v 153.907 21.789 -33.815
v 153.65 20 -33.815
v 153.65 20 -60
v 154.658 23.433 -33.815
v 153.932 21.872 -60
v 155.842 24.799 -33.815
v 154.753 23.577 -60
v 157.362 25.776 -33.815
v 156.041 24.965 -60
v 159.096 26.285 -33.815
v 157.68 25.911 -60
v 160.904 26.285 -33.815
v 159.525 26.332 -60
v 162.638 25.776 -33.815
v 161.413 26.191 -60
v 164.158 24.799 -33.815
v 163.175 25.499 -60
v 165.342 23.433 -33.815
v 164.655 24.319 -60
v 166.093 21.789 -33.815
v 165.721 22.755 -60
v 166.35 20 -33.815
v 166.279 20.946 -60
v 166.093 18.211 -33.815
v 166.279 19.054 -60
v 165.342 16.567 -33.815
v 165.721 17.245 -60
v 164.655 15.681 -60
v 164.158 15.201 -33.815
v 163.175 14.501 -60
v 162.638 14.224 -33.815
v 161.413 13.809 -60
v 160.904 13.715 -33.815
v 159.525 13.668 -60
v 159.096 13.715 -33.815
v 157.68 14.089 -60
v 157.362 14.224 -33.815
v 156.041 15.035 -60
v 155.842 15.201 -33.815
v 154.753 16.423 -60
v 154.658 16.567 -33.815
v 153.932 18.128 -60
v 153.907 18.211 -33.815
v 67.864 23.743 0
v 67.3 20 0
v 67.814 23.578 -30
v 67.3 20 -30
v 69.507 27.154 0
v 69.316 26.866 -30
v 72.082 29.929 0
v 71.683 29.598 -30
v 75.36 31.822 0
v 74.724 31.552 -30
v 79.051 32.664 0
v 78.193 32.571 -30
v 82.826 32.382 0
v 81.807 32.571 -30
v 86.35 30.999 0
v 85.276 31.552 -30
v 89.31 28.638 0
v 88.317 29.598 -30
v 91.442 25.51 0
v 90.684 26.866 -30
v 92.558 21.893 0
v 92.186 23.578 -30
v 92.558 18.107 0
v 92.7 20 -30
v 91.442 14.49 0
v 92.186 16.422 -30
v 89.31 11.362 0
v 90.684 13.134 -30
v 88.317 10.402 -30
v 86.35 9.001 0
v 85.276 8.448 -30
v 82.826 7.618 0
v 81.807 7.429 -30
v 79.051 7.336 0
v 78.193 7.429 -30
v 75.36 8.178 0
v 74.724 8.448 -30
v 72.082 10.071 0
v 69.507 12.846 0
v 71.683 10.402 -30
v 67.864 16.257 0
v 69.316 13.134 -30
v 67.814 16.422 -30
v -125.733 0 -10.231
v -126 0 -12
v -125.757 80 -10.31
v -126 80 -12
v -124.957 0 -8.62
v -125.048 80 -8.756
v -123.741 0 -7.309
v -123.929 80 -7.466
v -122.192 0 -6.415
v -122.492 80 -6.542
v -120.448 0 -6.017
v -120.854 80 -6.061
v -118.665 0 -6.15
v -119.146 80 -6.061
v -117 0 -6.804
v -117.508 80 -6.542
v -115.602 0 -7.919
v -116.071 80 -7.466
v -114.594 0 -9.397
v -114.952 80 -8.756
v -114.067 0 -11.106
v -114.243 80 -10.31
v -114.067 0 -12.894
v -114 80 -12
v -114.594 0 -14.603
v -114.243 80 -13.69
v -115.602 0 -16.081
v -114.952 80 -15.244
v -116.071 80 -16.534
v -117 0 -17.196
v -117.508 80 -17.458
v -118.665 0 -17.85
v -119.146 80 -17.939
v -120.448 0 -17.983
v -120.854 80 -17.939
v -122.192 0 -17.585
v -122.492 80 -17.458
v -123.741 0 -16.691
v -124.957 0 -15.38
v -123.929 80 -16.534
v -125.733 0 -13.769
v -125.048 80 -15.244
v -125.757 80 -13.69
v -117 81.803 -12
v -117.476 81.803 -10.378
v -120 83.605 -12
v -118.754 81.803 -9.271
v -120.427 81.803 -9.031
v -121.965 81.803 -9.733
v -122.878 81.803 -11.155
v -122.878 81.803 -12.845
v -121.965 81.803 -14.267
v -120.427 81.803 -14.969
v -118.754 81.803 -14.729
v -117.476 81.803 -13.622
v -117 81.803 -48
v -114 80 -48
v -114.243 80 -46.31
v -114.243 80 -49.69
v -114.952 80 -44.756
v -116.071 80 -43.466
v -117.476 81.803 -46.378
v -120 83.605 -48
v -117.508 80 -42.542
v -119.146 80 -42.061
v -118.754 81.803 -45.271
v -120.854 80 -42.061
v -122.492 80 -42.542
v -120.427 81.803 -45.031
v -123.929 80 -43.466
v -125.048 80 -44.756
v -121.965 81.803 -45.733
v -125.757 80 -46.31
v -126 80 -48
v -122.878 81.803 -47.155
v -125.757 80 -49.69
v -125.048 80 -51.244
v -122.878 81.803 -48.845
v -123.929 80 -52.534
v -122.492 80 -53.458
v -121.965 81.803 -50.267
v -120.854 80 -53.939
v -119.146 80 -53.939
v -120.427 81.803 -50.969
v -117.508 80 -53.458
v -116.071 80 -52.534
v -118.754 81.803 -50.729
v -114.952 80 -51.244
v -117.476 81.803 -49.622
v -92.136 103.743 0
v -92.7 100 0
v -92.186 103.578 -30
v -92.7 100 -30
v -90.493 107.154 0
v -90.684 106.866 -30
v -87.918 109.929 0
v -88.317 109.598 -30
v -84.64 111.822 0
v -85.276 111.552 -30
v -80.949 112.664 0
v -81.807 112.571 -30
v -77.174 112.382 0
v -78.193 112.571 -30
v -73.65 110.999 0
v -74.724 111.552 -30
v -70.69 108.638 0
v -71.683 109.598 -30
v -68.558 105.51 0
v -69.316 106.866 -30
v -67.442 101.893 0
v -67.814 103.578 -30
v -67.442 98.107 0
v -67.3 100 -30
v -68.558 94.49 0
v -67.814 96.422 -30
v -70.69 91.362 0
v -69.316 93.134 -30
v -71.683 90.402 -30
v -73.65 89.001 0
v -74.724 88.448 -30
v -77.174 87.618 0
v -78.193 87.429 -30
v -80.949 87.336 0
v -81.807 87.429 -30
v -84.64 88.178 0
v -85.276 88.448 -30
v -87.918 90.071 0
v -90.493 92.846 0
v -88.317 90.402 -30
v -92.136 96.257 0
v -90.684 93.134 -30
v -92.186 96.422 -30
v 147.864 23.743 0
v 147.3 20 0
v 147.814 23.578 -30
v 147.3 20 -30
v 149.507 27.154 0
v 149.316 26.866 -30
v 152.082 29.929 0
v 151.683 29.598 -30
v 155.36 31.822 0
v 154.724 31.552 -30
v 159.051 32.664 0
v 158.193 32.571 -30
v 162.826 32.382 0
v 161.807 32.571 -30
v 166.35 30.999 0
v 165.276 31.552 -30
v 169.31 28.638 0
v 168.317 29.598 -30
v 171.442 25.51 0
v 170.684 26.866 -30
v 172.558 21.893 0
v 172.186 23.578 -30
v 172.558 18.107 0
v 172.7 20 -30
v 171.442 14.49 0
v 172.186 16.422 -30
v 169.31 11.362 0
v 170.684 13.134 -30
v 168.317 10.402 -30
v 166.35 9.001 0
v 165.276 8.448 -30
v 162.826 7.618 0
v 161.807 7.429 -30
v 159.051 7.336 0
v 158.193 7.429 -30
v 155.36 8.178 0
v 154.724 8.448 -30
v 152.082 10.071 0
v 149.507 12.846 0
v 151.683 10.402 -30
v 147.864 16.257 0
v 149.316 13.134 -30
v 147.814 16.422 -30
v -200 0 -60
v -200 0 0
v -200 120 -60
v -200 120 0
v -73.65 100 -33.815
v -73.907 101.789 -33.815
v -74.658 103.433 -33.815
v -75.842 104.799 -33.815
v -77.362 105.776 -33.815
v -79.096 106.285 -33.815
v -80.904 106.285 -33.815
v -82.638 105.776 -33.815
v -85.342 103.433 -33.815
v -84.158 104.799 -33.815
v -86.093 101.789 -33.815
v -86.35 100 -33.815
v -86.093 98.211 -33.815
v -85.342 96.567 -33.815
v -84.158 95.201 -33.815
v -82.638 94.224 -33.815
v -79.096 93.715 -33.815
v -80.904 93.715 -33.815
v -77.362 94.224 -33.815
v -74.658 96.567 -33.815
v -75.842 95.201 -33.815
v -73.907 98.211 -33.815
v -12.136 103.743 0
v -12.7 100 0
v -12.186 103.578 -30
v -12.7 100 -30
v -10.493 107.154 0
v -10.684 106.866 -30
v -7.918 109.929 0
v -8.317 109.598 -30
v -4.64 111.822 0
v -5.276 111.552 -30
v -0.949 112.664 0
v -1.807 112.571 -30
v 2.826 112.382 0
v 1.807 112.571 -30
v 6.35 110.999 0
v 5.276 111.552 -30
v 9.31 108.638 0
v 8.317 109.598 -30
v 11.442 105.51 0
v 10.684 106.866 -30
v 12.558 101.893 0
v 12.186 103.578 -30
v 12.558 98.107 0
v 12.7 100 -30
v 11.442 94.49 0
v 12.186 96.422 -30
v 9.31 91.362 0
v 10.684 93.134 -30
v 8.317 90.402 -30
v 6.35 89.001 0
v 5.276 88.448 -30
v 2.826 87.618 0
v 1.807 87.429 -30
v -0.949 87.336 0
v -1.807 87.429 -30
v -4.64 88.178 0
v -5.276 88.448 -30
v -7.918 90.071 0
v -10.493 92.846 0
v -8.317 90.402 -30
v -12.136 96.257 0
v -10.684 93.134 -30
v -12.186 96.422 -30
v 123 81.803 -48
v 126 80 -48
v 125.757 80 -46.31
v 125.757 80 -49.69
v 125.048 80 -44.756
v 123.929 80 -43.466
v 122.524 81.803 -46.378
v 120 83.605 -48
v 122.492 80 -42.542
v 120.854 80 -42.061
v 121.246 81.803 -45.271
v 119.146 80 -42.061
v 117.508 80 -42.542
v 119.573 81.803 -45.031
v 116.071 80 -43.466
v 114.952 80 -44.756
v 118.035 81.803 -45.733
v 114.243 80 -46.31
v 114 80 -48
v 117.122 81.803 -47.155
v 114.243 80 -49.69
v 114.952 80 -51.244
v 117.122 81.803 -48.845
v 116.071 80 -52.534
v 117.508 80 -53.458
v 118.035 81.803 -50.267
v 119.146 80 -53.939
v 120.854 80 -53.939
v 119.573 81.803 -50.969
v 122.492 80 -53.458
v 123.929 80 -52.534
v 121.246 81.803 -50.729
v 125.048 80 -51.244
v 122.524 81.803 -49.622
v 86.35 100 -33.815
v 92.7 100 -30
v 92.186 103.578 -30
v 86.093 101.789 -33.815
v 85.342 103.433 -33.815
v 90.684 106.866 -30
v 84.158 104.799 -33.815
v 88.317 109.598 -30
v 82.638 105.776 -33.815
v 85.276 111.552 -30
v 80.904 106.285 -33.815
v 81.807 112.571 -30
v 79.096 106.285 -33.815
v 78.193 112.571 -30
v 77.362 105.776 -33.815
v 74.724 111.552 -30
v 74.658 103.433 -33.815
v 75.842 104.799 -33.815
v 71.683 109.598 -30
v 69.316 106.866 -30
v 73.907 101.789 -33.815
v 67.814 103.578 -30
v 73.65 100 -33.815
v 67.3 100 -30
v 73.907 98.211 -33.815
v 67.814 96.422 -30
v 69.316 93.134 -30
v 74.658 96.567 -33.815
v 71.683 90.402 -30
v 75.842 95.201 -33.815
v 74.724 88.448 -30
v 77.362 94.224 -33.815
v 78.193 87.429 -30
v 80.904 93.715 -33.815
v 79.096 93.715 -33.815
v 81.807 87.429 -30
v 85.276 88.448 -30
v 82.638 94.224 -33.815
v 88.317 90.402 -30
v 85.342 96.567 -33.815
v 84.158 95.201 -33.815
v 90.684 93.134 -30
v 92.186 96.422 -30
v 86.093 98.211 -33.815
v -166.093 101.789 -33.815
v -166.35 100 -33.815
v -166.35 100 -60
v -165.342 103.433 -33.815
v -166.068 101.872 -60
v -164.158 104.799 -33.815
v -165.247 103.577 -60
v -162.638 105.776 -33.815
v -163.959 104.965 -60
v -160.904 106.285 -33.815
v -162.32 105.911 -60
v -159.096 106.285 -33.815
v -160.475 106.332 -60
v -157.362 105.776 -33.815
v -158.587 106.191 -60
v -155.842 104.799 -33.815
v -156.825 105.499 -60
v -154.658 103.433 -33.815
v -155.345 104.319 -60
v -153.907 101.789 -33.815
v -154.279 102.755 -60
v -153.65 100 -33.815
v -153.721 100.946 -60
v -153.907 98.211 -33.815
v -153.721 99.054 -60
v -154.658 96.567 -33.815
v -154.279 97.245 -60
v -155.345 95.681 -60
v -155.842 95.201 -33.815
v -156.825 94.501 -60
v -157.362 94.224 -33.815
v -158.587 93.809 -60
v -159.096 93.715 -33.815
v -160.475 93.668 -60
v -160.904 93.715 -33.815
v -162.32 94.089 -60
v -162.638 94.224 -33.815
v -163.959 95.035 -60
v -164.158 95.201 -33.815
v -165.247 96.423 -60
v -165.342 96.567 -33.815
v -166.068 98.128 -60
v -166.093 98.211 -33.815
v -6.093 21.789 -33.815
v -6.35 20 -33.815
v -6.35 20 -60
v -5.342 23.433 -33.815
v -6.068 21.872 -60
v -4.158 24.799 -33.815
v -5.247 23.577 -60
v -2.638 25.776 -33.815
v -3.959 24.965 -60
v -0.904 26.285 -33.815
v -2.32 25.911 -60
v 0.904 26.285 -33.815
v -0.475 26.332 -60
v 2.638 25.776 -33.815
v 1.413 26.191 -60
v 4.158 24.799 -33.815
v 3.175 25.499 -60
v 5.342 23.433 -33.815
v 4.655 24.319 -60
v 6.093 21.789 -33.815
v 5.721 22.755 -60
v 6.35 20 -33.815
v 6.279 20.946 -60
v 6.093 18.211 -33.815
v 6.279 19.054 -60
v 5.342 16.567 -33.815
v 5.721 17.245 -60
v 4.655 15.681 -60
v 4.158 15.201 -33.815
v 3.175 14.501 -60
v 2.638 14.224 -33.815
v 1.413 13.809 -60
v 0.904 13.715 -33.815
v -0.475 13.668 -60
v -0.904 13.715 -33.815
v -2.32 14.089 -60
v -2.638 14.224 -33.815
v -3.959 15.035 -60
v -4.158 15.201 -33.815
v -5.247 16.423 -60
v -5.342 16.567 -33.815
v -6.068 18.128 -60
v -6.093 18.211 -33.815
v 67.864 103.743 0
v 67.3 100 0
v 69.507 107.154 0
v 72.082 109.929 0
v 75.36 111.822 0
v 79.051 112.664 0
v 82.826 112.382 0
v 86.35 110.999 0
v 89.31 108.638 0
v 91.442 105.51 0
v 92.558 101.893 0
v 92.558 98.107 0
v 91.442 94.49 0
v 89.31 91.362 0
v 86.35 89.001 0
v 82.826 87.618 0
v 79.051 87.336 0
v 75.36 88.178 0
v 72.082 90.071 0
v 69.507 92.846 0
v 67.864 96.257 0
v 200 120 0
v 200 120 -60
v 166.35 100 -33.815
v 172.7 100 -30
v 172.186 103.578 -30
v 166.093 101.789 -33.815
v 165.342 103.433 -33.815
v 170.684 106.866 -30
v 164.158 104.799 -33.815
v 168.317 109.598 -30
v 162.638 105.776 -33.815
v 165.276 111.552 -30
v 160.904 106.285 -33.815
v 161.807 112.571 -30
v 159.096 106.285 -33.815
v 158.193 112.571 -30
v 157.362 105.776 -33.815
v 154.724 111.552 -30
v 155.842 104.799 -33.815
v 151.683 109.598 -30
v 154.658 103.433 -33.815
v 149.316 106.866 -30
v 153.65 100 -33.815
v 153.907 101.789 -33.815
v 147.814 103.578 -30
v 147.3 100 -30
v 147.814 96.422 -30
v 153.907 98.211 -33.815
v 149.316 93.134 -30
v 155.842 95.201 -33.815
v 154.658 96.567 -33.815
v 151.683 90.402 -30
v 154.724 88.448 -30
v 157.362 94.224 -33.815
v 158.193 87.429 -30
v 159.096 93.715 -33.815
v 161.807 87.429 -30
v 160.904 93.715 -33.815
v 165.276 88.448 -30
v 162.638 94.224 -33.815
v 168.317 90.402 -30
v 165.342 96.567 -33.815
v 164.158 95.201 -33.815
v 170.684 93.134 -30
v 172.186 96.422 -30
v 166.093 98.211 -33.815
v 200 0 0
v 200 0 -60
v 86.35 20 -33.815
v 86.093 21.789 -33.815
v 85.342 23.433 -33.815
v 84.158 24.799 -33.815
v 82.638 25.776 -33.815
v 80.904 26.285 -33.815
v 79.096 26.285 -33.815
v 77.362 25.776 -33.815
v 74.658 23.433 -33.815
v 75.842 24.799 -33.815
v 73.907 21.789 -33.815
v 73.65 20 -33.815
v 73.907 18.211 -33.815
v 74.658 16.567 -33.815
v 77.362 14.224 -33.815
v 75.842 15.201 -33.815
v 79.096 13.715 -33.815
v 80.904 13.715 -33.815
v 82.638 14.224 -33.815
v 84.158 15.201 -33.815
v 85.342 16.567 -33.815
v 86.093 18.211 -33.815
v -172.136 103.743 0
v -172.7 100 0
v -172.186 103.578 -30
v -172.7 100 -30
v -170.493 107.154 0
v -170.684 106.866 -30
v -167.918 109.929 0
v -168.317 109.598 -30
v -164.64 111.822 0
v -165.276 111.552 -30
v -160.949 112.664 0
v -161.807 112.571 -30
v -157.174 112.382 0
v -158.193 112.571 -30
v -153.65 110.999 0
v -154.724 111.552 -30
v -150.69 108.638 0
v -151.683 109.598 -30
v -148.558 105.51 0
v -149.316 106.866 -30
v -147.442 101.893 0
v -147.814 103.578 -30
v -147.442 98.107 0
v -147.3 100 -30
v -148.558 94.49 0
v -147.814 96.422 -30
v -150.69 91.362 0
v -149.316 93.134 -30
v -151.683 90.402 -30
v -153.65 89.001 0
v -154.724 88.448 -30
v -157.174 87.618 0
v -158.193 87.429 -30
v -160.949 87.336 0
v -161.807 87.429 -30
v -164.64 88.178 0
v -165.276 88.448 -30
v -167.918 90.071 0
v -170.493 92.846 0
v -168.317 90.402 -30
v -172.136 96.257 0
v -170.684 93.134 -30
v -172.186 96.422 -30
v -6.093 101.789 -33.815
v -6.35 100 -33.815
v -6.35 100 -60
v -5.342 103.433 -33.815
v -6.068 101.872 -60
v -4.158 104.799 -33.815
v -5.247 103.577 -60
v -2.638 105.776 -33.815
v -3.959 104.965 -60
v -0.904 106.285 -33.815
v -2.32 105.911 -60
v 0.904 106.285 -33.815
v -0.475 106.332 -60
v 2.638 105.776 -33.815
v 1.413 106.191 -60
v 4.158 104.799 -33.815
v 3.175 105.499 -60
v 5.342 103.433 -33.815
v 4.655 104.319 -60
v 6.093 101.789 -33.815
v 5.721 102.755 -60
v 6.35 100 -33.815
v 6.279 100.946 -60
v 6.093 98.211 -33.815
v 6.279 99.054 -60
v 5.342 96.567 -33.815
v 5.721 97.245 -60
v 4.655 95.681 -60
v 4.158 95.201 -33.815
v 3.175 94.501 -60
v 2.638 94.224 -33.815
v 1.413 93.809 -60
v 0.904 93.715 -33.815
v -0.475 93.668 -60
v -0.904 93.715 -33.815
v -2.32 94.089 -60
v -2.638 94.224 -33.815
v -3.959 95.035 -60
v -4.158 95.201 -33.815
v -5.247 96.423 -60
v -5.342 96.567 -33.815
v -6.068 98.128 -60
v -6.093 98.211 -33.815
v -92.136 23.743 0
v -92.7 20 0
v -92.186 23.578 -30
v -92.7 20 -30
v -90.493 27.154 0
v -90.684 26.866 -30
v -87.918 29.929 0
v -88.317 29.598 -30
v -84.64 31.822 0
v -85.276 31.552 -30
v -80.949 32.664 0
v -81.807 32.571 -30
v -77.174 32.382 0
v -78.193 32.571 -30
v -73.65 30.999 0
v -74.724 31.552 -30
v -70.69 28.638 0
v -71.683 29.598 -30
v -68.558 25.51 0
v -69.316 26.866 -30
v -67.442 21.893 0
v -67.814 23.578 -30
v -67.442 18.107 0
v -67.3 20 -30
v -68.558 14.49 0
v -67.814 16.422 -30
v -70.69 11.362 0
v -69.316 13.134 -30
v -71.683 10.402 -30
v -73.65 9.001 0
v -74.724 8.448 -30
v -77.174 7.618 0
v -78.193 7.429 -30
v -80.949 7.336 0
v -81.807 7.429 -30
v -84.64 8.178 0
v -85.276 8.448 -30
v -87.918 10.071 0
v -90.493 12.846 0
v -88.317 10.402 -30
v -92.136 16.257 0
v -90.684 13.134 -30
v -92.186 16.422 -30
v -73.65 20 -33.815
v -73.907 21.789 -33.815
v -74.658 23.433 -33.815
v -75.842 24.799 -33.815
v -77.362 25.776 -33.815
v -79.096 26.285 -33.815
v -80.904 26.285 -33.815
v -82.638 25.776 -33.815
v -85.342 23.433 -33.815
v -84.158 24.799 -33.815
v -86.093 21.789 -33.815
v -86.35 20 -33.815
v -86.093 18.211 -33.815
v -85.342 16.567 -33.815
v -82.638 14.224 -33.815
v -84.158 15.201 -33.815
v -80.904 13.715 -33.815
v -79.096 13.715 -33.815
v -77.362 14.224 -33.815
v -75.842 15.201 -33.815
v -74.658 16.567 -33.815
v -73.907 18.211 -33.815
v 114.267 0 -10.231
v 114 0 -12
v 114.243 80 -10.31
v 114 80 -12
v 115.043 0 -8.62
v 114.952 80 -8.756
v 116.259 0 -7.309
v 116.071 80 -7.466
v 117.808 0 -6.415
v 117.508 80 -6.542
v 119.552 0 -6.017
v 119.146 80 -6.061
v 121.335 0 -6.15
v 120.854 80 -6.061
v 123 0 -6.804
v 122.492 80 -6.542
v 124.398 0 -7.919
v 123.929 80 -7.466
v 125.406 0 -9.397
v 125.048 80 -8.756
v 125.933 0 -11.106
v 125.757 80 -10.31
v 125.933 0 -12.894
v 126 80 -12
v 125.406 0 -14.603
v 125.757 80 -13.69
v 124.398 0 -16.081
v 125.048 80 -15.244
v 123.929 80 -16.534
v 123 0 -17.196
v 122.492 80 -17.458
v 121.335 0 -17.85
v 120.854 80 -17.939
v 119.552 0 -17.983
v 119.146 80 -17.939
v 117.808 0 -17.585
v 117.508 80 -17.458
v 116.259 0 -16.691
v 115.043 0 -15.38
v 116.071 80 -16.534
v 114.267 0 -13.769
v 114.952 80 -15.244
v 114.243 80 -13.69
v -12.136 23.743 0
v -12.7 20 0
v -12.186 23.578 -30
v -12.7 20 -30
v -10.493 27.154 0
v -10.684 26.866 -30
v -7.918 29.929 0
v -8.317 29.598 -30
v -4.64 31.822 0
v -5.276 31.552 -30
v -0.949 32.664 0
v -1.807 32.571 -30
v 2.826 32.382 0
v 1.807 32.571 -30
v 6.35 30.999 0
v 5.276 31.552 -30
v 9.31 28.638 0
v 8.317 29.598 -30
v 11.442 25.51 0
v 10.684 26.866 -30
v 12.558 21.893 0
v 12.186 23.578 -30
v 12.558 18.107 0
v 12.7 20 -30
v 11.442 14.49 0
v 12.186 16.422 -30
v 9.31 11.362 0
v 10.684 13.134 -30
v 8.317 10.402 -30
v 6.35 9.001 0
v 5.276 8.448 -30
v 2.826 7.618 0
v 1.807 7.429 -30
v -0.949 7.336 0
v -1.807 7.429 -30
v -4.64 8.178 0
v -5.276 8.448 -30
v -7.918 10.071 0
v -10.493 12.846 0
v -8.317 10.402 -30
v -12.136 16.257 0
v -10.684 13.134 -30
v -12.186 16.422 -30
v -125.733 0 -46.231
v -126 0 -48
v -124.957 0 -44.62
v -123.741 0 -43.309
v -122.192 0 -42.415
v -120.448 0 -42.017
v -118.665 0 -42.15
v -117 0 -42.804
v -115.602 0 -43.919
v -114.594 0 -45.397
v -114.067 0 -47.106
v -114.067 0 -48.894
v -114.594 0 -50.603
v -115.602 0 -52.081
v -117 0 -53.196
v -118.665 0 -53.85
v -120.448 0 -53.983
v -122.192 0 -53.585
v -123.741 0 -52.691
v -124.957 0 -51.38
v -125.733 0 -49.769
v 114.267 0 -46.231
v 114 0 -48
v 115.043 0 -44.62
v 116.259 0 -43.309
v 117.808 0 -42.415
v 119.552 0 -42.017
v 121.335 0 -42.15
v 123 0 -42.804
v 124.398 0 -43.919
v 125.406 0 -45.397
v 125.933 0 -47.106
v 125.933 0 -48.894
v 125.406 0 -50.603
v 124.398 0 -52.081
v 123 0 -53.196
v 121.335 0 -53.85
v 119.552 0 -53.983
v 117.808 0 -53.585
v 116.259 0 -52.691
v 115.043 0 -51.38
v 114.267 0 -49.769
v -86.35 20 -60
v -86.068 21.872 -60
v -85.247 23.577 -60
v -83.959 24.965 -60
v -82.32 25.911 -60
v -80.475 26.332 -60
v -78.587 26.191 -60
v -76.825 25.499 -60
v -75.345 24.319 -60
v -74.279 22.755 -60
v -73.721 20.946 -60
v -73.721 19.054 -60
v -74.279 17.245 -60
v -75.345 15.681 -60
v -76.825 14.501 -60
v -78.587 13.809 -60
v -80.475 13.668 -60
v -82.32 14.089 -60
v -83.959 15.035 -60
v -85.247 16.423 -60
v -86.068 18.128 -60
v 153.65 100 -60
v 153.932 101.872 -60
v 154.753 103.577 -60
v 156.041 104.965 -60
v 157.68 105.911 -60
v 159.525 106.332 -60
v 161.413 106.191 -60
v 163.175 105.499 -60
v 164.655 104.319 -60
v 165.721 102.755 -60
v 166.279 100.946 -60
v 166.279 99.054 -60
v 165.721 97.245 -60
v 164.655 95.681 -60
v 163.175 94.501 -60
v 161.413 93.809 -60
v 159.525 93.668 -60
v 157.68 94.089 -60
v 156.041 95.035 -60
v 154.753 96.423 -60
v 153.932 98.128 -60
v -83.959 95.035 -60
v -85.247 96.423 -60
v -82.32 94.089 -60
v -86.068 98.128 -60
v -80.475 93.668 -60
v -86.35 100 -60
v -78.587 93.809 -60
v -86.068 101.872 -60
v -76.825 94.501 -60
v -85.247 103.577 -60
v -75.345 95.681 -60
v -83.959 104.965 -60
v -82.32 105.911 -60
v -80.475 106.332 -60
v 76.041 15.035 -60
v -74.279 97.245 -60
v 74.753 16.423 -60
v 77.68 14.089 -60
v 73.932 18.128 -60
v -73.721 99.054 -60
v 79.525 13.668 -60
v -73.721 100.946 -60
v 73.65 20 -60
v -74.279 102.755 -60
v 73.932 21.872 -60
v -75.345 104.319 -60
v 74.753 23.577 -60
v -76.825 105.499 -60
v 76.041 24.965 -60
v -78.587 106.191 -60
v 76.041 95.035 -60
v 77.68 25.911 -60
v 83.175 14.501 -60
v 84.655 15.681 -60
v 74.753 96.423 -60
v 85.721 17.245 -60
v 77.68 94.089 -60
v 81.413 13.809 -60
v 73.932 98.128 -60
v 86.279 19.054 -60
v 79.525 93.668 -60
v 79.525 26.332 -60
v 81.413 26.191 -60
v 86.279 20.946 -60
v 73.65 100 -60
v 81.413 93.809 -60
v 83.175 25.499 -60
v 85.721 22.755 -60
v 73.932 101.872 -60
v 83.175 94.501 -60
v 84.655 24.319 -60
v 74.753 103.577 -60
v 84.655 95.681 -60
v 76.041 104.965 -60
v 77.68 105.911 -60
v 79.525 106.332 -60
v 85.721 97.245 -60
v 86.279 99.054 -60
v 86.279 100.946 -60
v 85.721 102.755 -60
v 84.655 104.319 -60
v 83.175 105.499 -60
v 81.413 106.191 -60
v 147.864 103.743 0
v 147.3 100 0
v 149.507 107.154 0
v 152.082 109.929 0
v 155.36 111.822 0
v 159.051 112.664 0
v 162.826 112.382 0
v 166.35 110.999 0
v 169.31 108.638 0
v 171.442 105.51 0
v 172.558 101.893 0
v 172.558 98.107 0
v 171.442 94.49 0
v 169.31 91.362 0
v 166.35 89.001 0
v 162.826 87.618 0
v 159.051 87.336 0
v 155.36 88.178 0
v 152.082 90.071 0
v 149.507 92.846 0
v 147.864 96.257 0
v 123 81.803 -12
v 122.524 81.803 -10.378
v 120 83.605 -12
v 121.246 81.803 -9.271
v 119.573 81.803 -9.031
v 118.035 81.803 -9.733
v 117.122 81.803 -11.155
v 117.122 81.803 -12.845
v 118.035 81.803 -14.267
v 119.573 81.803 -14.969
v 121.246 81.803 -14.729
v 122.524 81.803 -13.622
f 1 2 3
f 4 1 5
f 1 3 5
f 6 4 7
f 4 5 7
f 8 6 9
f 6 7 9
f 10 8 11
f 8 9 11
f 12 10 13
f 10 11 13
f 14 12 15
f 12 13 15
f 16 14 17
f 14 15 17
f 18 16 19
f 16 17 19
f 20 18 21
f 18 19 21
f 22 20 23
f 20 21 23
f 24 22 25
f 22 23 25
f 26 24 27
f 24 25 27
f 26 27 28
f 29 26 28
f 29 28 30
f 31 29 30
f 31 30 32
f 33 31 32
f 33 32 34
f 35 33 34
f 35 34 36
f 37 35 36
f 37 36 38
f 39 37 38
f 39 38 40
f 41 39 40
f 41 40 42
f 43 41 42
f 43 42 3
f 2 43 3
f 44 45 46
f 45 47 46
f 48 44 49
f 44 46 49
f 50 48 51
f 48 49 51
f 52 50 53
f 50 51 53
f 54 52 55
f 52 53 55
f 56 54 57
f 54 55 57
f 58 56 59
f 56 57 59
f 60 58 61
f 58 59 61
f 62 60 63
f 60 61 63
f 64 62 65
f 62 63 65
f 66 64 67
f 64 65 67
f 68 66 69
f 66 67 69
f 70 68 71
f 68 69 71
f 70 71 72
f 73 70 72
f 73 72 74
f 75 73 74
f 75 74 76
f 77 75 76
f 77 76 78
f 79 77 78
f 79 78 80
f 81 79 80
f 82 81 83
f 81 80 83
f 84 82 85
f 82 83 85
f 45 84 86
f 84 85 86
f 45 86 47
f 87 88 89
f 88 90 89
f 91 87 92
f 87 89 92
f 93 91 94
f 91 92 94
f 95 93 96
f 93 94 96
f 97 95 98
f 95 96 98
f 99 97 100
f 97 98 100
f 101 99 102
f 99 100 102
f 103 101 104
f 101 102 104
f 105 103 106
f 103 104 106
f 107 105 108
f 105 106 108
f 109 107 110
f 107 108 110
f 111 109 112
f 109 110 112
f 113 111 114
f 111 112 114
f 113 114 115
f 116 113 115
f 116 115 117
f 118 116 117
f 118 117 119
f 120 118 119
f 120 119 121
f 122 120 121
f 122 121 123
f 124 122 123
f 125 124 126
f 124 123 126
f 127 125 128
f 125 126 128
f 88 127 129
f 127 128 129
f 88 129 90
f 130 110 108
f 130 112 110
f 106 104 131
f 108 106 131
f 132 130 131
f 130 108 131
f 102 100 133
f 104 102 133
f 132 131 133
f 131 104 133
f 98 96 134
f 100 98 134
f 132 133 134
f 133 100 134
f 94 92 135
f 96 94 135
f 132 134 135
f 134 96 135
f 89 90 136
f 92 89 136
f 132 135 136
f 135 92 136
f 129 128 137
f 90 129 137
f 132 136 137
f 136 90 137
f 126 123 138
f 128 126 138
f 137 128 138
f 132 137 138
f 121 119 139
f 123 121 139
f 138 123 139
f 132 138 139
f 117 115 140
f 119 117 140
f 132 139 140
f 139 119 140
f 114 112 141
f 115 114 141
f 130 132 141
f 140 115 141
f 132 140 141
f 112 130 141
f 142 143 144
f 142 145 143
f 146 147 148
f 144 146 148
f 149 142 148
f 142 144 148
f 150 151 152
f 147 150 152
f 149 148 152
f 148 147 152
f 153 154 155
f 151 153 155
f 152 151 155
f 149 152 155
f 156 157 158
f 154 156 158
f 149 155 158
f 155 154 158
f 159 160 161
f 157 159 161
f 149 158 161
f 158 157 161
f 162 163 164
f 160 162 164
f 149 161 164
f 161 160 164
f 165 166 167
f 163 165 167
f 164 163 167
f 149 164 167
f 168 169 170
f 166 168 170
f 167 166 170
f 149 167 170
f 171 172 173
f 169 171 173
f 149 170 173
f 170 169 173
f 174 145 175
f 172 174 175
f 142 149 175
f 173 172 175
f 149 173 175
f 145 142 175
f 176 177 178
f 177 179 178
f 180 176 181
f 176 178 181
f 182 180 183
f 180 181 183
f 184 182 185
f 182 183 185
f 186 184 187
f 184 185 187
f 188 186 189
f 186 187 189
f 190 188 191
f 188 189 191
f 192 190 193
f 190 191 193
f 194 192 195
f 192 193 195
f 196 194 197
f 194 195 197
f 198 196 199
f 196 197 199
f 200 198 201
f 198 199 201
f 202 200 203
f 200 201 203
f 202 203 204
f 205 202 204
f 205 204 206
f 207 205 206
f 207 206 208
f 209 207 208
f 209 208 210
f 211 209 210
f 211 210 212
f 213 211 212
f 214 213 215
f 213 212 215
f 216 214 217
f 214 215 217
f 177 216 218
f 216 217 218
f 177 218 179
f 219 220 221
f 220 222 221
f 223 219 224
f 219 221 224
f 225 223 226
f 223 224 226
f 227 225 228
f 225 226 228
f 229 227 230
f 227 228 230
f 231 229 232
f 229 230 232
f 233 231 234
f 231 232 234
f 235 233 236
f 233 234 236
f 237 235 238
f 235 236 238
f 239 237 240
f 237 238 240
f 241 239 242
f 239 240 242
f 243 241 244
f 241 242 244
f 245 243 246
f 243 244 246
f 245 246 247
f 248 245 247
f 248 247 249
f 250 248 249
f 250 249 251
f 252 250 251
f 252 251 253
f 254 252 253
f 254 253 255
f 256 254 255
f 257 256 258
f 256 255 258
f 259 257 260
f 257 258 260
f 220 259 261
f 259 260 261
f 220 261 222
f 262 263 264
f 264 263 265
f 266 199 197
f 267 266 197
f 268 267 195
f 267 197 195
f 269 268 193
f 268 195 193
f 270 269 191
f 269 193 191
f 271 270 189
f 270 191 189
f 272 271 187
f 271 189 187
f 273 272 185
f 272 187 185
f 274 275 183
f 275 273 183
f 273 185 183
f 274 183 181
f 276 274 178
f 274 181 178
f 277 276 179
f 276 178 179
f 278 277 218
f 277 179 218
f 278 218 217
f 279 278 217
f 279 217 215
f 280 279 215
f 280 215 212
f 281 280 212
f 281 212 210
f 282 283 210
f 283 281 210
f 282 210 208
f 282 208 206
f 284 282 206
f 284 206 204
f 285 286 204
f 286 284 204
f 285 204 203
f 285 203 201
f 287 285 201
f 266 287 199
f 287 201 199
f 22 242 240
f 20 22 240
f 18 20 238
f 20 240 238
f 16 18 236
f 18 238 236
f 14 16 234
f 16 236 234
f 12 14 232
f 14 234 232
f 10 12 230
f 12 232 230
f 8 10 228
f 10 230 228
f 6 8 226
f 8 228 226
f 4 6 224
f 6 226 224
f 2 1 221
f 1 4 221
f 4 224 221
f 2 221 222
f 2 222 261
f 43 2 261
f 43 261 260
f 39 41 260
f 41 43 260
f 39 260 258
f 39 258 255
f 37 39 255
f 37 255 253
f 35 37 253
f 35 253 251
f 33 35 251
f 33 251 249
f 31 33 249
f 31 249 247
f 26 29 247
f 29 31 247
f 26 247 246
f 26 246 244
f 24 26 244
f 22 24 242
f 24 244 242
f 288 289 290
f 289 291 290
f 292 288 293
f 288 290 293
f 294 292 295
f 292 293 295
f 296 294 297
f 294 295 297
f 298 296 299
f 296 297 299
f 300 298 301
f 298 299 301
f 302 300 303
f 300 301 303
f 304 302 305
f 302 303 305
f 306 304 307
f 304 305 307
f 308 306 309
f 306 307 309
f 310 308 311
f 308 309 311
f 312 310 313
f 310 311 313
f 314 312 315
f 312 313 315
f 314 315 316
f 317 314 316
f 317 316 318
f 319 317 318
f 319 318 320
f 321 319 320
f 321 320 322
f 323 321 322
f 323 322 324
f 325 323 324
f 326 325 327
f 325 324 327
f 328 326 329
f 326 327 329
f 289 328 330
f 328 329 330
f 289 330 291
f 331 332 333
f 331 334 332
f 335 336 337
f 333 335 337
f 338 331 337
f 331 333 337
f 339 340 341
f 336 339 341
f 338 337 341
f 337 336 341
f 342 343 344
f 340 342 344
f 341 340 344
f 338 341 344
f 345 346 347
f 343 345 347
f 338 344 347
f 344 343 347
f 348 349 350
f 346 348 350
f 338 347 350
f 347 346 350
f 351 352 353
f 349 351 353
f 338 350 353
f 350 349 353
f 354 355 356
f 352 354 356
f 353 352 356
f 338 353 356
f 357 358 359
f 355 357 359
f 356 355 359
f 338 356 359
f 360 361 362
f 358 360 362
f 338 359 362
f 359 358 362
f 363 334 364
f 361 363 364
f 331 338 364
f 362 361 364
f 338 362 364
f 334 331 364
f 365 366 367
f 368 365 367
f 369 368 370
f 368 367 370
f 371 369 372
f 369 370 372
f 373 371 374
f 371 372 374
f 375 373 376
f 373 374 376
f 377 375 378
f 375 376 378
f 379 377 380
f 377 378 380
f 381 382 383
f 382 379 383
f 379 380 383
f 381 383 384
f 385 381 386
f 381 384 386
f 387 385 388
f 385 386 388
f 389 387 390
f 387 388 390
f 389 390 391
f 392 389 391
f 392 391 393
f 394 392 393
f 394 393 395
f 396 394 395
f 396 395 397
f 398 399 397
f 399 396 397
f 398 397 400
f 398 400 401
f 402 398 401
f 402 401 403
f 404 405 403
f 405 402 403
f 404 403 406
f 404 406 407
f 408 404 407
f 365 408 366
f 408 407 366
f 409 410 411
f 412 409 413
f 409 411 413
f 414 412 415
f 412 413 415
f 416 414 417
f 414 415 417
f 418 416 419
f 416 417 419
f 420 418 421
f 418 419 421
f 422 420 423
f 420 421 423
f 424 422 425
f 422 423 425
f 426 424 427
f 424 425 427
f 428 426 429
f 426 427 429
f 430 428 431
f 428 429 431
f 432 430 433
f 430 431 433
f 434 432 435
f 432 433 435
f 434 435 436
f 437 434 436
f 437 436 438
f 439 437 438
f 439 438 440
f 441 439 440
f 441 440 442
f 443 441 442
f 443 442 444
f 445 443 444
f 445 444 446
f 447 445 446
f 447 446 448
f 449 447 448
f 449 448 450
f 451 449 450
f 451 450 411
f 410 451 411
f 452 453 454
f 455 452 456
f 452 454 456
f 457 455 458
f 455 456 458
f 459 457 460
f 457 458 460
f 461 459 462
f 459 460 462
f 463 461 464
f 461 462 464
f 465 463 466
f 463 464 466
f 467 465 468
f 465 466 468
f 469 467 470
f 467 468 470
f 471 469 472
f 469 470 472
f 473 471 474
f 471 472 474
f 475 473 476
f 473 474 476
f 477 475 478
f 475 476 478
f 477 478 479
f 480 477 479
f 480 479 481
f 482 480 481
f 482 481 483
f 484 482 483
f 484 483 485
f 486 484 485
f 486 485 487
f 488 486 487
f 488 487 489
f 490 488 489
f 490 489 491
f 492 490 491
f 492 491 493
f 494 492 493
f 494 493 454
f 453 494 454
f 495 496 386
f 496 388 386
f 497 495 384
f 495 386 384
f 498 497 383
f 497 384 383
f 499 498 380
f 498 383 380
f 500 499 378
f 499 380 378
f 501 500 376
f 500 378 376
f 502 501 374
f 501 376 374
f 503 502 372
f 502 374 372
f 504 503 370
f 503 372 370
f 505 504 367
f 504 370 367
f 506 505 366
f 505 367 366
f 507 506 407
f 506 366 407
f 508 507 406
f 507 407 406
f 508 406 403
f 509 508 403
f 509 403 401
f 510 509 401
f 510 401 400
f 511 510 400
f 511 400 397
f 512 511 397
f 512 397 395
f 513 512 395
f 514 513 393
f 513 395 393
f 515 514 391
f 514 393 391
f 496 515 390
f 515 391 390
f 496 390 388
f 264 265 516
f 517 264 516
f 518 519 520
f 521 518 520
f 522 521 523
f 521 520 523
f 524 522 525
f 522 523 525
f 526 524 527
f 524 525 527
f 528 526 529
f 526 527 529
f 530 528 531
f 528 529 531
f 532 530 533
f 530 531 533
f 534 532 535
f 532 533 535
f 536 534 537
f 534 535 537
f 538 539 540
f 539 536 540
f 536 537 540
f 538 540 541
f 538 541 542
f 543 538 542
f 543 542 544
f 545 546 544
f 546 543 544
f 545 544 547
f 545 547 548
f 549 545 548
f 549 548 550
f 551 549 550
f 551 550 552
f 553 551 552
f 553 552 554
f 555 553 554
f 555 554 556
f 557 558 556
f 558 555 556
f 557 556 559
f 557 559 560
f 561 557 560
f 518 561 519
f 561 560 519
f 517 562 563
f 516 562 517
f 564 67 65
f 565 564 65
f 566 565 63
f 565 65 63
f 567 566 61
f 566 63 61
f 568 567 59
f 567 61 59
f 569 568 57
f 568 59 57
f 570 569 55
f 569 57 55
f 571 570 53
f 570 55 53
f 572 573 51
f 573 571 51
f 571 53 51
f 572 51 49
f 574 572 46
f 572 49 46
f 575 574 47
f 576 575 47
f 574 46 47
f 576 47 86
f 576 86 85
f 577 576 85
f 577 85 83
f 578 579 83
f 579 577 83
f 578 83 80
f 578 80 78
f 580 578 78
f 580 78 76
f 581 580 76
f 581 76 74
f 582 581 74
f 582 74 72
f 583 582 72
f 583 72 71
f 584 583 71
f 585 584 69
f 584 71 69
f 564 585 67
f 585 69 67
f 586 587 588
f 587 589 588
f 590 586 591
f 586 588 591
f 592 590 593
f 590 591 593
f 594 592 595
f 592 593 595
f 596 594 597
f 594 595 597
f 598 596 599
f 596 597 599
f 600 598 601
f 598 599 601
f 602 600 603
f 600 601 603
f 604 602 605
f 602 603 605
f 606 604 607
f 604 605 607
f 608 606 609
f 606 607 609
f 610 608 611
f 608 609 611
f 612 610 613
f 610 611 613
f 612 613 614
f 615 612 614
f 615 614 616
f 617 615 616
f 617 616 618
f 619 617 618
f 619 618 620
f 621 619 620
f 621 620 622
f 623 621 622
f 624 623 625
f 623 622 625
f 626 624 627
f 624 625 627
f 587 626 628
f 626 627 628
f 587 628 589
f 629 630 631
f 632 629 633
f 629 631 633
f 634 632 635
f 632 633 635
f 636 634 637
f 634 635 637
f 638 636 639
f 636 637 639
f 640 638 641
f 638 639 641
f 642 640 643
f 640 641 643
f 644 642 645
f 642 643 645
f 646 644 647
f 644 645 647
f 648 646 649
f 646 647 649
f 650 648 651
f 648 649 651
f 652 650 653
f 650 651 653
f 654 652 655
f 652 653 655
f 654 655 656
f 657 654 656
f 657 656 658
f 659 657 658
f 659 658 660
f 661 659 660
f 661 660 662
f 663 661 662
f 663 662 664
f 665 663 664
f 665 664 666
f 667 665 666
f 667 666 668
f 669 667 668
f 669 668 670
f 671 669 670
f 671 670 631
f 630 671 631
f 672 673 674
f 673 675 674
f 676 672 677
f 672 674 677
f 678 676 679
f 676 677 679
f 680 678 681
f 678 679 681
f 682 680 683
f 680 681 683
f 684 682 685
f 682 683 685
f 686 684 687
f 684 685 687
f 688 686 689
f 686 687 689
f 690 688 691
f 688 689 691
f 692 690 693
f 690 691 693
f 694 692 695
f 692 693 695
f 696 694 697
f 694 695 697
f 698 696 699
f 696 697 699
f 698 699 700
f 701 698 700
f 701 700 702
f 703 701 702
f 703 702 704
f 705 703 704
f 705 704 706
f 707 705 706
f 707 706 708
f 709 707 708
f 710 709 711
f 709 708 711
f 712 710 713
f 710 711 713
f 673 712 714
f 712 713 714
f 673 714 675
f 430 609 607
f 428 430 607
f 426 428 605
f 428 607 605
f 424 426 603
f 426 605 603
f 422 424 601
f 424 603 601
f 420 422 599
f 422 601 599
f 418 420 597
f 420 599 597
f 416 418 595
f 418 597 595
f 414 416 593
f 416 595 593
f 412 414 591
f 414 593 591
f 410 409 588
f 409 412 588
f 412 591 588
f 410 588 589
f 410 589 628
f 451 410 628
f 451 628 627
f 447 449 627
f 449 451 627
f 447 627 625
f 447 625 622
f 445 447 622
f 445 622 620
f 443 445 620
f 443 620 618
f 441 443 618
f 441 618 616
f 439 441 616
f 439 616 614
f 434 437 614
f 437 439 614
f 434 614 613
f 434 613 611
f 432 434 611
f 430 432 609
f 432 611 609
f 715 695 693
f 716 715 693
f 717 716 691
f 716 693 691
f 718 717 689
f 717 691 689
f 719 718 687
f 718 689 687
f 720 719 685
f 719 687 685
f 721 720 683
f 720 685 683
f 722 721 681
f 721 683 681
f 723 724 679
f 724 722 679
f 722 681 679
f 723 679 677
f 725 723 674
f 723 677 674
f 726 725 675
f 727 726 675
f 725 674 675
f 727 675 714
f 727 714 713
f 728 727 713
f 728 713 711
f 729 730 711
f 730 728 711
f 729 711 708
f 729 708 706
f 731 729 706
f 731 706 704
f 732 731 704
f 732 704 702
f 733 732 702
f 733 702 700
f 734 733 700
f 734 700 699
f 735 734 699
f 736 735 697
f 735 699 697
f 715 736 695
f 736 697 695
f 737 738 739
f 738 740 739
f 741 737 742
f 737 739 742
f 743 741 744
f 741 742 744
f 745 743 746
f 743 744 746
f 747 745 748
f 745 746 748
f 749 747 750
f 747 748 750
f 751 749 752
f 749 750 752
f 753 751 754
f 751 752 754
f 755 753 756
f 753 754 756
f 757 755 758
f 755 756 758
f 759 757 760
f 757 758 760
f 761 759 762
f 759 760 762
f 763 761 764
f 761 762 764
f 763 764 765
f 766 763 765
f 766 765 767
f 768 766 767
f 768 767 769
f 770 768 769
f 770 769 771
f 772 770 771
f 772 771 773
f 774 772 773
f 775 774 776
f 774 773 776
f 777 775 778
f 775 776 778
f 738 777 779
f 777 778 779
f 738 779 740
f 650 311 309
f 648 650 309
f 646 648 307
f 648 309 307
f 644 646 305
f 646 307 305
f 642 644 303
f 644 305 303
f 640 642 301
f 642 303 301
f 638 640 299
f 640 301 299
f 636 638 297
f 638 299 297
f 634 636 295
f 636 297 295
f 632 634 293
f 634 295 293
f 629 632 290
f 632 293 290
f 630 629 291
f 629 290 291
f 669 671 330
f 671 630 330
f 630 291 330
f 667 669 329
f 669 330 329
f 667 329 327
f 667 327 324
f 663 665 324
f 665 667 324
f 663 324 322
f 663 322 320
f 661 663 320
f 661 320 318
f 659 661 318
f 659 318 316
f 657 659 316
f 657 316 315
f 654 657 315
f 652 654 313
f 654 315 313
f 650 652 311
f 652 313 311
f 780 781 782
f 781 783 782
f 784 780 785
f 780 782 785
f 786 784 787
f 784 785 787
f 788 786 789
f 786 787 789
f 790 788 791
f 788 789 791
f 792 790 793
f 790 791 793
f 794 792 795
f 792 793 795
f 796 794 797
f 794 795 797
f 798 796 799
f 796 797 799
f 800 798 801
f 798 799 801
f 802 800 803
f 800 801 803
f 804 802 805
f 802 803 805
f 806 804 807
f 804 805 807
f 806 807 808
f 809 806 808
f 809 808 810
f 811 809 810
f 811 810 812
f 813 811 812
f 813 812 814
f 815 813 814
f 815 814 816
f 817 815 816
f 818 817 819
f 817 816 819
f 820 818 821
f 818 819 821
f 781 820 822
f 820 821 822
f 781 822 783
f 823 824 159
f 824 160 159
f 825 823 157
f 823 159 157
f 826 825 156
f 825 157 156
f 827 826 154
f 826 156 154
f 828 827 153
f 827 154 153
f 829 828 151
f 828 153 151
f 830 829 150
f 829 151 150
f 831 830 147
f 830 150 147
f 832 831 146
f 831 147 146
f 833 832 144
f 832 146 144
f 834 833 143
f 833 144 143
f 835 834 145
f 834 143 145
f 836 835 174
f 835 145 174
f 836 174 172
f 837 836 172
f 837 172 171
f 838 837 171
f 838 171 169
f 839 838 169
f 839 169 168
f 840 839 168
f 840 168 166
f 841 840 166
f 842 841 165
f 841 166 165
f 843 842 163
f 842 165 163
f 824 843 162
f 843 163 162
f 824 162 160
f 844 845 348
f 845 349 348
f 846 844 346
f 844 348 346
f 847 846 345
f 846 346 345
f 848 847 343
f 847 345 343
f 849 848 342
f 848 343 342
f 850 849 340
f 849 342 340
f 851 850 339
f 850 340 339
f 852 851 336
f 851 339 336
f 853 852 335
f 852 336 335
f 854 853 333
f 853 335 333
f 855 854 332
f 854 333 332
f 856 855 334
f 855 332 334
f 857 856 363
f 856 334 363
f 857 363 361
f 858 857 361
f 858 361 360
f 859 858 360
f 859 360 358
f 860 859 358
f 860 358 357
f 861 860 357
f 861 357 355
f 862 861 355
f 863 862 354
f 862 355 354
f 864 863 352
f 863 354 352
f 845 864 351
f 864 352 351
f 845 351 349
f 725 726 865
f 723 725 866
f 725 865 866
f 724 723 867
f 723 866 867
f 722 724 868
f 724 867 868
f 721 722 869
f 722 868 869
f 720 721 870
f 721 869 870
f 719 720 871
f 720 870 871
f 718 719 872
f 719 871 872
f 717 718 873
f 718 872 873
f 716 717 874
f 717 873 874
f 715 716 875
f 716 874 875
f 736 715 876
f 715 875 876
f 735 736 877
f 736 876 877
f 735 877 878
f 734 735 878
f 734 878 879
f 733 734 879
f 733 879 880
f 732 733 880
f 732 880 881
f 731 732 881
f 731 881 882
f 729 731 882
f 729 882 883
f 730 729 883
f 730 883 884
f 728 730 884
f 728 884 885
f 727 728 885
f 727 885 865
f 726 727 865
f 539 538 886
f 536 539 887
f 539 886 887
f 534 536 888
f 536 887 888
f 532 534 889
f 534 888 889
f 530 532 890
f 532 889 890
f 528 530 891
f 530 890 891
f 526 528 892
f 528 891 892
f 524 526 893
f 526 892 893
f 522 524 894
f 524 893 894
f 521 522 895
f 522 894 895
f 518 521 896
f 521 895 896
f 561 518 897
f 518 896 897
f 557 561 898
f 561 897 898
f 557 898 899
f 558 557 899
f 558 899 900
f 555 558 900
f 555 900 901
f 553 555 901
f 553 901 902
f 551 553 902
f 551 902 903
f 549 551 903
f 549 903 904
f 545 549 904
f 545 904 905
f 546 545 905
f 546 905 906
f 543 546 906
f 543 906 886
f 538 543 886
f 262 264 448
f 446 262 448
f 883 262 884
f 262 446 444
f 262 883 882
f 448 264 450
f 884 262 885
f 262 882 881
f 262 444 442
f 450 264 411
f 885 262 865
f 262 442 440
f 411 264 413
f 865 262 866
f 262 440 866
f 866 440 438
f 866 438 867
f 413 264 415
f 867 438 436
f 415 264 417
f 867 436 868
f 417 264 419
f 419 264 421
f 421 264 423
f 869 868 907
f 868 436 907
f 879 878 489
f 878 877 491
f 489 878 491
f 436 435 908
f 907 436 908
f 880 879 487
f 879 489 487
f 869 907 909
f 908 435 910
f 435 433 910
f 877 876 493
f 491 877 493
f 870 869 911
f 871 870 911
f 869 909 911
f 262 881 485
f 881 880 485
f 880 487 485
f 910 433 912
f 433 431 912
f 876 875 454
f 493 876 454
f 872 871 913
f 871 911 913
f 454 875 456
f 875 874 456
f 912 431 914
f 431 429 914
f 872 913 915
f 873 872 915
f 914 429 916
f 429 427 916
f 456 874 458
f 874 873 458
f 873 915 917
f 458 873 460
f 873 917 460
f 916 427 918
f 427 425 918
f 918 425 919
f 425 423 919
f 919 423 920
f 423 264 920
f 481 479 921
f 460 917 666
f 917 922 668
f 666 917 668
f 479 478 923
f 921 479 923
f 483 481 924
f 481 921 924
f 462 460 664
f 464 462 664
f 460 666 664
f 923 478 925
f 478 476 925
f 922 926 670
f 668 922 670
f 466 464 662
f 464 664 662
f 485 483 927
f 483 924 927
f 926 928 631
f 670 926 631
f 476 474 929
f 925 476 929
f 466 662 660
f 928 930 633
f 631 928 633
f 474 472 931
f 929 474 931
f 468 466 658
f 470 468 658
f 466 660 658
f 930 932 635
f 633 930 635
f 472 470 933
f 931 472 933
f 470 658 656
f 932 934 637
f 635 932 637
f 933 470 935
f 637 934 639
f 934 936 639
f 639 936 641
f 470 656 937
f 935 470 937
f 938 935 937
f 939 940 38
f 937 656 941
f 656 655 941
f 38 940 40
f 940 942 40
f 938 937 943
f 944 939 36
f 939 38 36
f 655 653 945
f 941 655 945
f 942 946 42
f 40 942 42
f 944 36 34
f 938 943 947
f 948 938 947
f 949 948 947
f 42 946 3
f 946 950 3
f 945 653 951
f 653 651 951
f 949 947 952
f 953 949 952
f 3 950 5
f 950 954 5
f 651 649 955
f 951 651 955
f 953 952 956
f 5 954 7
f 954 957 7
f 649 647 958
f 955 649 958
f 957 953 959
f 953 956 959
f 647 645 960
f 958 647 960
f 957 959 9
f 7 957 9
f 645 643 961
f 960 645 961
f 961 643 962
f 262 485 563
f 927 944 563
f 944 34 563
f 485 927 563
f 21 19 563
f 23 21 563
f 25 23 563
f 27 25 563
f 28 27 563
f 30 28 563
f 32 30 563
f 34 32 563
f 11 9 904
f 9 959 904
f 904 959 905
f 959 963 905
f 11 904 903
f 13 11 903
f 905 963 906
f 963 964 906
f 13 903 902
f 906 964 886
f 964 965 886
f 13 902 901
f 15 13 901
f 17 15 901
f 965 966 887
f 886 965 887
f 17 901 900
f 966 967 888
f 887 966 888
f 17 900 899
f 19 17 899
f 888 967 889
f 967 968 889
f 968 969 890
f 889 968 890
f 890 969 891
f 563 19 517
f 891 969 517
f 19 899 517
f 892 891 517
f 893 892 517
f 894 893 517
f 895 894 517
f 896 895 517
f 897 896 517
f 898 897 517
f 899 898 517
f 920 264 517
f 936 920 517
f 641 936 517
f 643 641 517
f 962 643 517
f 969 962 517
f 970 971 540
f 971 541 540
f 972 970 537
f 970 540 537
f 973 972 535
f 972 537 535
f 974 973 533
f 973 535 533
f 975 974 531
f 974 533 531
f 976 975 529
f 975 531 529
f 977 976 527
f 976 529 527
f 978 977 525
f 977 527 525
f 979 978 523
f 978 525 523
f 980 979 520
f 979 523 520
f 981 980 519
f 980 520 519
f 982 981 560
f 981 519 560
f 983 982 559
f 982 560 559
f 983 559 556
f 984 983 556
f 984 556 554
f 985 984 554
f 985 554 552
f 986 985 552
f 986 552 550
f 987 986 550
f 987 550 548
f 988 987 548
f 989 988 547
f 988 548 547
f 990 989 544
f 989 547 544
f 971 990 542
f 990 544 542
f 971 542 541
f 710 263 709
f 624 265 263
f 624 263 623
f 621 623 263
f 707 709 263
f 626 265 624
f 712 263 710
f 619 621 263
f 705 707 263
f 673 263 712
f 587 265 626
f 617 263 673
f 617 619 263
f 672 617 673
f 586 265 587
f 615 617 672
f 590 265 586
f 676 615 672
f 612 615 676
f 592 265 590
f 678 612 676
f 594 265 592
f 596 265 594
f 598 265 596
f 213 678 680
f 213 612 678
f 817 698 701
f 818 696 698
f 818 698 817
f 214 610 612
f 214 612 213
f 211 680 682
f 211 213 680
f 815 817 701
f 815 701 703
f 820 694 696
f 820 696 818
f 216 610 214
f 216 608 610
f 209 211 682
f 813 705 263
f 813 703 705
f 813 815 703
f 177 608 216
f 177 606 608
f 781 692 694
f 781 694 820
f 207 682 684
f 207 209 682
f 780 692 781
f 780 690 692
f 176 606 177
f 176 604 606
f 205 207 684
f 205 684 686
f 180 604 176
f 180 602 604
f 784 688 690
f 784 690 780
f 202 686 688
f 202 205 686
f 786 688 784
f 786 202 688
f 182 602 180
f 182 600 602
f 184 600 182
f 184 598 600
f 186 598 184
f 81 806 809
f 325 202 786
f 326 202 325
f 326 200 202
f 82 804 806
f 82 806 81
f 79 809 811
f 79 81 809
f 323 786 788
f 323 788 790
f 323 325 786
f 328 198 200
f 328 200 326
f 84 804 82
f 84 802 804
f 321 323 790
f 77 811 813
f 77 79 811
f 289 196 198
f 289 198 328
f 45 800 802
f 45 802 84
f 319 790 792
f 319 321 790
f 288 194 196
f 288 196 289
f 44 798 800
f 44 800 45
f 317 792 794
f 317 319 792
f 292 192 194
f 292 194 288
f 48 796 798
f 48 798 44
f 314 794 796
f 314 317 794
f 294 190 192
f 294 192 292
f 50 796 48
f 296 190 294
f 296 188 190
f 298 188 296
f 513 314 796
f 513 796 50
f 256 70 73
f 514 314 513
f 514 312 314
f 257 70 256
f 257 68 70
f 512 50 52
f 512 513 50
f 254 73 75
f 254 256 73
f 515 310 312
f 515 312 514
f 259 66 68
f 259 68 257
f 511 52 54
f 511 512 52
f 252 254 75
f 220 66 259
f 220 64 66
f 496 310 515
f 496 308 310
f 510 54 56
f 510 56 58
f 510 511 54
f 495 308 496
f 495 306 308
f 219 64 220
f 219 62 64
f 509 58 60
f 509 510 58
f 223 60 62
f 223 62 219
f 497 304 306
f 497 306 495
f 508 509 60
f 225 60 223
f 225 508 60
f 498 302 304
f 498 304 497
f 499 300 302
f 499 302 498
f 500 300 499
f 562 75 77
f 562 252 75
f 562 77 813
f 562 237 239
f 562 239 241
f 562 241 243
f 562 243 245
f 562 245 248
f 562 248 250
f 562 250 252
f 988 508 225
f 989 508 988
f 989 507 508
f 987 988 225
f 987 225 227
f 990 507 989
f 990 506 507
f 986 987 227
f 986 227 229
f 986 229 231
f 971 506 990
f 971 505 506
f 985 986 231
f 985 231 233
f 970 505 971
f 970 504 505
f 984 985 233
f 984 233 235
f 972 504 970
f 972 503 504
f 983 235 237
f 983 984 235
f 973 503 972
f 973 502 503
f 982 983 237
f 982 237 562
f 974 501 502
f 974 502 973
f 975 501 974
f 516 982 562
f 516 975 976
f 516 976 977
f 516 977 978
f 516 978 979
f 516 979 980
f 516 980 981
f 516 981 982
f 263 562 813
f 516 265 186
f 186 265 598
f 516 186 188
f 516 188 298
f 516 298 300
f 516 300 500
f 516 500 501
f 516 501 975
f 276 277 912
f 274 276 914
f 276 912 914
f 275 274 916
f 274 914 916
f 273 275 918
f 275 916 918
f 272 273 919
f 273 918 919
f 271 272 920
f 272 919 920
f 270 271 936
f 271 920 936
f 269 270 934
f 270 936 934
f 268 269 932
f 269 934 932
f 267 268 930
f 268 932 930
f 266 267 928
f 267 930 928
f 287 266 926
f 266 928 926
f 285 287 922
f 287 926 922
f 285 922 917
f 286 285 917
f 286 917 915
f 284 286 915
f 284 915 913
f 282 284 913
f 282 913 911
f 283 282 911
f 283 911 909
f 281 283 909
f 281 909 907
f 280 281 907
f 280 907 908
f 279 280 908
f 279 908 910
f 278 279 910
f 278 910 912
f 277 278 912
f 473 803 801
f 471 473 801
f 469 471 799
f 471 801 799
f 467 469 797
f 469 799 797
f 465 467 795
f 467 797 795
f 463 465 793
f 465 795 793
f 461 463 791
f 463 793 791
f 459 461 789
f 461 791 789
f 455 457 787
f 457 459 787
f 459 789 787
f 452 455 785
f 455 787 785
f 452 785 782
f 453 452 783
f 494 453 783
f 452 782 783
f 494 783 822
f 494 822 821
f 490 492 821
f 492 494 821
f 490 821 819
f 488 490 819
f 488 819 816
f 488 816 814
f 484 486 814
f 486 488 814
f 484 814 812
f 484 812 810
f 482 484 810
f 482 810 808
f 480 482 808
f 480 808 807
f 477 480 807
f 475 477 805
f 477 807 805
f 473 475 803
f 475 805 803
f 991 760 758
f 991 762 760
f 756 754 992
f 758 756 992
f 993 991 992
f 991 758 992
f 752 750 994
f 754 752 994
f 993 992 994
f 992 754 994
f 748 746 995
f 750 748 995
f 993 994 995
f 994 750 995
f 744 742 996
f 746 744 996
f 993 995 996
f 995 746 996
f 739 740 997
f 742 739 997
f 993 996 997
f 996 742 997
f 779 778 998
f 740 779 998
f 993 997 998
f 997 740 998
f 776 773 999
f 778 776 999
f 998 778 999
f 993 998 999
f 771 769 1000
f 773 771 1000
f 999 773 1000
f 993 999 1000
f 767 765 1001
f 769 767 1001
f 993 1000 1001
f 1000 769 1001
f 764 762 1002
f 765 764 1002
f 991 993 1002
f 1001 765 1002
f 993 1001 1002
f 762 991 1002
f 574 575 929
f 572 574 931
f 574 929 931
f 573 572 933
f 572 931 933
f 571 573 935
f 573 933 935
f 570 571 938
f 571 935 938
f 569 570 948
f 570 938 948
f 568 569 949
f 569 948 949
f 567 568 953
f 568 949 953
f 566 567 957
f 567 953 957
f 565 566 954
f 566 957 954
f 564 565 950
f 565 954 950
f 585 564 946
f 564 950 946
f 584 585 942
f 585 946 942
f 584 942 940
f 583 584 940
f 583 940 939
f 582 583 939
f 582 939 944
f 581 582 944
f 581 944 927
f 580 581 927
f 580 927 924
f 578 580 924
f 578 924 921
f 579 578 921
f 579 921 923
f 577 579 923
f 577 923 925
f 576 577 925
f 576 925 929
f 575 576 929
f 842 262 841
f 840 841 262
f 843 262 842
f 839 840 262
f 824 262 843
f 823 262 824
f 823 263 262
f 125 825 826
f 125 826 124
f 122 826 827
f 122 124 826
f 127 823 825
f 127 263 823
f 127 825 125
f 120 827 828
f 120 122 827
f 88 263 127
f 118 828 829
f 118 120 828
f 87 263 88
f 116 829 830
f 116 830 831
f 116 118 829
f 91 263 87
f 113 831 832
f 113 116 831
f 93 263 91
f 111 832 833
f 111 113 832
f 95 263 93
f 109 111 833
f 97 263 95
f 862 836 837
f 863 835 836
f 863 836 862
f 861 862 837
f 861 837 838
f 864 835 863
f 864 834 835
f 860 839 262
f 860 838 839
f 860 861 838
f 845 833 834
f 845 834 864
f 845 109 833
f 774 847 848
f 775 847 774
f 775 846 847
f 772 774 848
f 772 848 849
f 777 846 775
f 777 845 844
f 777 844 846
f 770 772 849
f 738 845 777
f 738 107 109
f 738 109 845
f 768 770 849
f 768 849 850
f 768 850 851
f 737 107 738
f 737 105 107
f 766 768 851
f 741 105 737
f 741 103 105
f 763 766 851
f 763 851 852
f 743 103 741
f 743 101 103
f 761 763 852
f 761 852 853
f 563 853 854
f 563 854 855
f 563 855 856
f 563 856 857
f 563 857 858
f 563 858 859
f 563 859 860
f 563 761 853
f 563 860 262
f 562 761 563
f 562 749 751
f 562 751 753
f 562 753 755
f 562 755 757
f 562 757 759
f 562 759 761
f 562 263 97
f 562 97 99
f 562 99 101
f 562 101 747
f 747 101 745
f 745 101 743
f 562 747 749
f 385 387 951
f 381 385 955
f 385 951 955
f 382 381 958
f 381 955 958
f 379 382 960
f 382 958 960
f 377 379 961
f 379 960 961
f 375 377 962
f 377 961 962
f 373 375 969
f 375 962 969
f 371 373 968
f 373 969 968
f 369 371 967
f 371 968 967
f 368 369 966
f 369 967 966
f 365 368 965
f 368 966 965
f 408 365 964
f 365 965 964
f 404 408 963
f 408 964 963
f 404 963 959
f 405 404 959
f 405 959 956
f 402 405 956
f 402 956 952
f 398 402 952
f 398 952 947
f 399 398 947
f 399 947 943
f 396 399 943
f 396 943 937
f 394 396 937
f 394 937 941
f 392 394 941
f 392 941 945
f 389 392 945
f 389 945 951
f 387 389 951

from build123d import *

# Parameters (mm, degrees)
F0_W     = 400
F0_H     = 120
F0_R     = 12.7
F0_R_2   = 6.35
F1_DEPTH = 60
F3_D     = 12
F3_DEPTH = 80
F3_TIP   = 3.6051637142
F4_D     = 25.4
F4_DEPTH = 30
F4_TIP   = 7.6309298617
F5_D     = 12.7


with BuildPart() as f1:
    # F0 (on Top) → F1 (new body)
    with BuildSketch(Plane.XY):
        with Locations((0, 60)):
            Rectangle(F0_W, F0_H)
        with Locations((-80, 20)):
            Circle(F0_R, mode=Mode.SUBTRACT)
        with Locations((0, 20)):
            Circle(F0_R, mode=Mode.SUBTRACT)
        with Locations((80, 20)):
            Circle(F0_R, mode=Mode.SUBTRACT)
        with Locations((160, 20)):
            Circle(F0_R, mode=Mode.SUBTRACT)
        with Locations((-160, 100)):
            Circle(F0_R, mode=Mode.SUBTRACT)
        with Locations((-80, 100)):
            Circle(F0_R, mode=Mode.SUBTRACT)
        with Locations((0, 100)):
            Circle(F0_R, mode=Mode.SUBTRACT)
        with Locations((80, 100)):
            Circle(F0_R, mode=Mode.SUBTRACT)
        with Locations((160, 100)):
            Circle(F0_R, mode=Mode.SUBTRACT)
        with Locations((-160, 100)):
            Circle(F0_R)
        with Locations((-160, 100)):
            Circle(F0_R_2, mode=Mode.SUBTRACT)
        with Locations((-80, 100)):
            Circle(F0_R)
        with Locations((-80, 100)):
            Circle(F0_R_2, mode=Mode.SUBTRACT)
        with Locations((0, 100)):
            Circle(F0_R)
        with Locations((0, 100)):
            Circle(F0_R_2, mode=Mode.SUBTRACT)
        with Locations((80, 100)):
            Circle(F0_R)
        with Locations((80, 100)):
            Circle(F0_R_2, mode=Mode.SUBTRACT)
        with Locations((160, 100)):
            Circle(F0_R)
        with Locations((160, 100)):
            Circle(F0_R_2, mode=Mode.SUBTRACT)
        with Locations((80, 20)):
            Circle(F0_R)
        with Locations((80, 20)):
            Circle(F0_R_2, mode=Mode.SUBTRACT)
        with Locations((160, 20)):
            Circle(F0_R)
        with Locations((160, 20)):
            Circle(F0_R_2, mode=Mode.SUBTRACT)
        with Locations((0, 20)):
            Circle(F0_R)
        with Locations((0, 20)):
            Circle(F0_R_2, mode=Mode.SUBTRACT)
        with Locations((-80, 20)):
            Circle(F0_R)
        with Locations((-80, 20)):
            Circle(F0_R_2, mode=Mode.SUBTRACT)
        with Locations((-160, 100)):
            Circle(F0_R_2)
        with Locations((-80, 100)):
            Circle(F0_R_2)
        with Locations((0, 100)):
            Circle(F0_R_2)
        with Locations((80, 100)):
            Circle(F0_R_2)
        with Locations((160, 100)):
            Circle(F0_R_2)
        with Locations((80, 20)):
            Circle(F0_R_2)
        with Locations((160, 20)):
            Circle(F0_R_2)
        with Locations((0, 20)):
            Circle(F0_R_2)
        with Locations((-80, 20)):
            Circle(F0_R_2)
    extrude(amount=-F1_DEPTH)

    # F3
    with Locations(Plane.XZ):
        with Locations((-120, -12), (-120, -48), (120, -48), (120, -12)):
            Hole(F3_D / 2, depth=F3_DEPTH)
            with Locations((0, 0, -(F3_DEPTH + F3_TIP / 2))):  # 118° drill point
                Cone(0, F3_D / 2, F3_TIP, mode=Mode.SUBTRACT)

    # F4
    with Locations(Plane.XY):
        with Locations((-160, 100), (-80, 100), (0, 100), (80, 100), (160, 100), (160, 20), (80, 20), (0, 20), (-80, 20)):
            Hole(F4_D / 2, depth=F4_DEPTH)
            with Locations((0, 0, -(F4_DEPTH + F4_TIP / 2))):  # 118° drill point
                Cone(0, F4_D / 2, F4_TIP, mode=Mode.SUBTRACT)

    # F5 (through all)
    with Locations(Plane.XY):
        with Locations((-80, 20), (-80, 100), (-160, 100), (0, 100), (0, 20), (80, 20), (80, 100), (160, 100), (160, 20)):
            Hole(F5_D / 2)


solid = f1.part
